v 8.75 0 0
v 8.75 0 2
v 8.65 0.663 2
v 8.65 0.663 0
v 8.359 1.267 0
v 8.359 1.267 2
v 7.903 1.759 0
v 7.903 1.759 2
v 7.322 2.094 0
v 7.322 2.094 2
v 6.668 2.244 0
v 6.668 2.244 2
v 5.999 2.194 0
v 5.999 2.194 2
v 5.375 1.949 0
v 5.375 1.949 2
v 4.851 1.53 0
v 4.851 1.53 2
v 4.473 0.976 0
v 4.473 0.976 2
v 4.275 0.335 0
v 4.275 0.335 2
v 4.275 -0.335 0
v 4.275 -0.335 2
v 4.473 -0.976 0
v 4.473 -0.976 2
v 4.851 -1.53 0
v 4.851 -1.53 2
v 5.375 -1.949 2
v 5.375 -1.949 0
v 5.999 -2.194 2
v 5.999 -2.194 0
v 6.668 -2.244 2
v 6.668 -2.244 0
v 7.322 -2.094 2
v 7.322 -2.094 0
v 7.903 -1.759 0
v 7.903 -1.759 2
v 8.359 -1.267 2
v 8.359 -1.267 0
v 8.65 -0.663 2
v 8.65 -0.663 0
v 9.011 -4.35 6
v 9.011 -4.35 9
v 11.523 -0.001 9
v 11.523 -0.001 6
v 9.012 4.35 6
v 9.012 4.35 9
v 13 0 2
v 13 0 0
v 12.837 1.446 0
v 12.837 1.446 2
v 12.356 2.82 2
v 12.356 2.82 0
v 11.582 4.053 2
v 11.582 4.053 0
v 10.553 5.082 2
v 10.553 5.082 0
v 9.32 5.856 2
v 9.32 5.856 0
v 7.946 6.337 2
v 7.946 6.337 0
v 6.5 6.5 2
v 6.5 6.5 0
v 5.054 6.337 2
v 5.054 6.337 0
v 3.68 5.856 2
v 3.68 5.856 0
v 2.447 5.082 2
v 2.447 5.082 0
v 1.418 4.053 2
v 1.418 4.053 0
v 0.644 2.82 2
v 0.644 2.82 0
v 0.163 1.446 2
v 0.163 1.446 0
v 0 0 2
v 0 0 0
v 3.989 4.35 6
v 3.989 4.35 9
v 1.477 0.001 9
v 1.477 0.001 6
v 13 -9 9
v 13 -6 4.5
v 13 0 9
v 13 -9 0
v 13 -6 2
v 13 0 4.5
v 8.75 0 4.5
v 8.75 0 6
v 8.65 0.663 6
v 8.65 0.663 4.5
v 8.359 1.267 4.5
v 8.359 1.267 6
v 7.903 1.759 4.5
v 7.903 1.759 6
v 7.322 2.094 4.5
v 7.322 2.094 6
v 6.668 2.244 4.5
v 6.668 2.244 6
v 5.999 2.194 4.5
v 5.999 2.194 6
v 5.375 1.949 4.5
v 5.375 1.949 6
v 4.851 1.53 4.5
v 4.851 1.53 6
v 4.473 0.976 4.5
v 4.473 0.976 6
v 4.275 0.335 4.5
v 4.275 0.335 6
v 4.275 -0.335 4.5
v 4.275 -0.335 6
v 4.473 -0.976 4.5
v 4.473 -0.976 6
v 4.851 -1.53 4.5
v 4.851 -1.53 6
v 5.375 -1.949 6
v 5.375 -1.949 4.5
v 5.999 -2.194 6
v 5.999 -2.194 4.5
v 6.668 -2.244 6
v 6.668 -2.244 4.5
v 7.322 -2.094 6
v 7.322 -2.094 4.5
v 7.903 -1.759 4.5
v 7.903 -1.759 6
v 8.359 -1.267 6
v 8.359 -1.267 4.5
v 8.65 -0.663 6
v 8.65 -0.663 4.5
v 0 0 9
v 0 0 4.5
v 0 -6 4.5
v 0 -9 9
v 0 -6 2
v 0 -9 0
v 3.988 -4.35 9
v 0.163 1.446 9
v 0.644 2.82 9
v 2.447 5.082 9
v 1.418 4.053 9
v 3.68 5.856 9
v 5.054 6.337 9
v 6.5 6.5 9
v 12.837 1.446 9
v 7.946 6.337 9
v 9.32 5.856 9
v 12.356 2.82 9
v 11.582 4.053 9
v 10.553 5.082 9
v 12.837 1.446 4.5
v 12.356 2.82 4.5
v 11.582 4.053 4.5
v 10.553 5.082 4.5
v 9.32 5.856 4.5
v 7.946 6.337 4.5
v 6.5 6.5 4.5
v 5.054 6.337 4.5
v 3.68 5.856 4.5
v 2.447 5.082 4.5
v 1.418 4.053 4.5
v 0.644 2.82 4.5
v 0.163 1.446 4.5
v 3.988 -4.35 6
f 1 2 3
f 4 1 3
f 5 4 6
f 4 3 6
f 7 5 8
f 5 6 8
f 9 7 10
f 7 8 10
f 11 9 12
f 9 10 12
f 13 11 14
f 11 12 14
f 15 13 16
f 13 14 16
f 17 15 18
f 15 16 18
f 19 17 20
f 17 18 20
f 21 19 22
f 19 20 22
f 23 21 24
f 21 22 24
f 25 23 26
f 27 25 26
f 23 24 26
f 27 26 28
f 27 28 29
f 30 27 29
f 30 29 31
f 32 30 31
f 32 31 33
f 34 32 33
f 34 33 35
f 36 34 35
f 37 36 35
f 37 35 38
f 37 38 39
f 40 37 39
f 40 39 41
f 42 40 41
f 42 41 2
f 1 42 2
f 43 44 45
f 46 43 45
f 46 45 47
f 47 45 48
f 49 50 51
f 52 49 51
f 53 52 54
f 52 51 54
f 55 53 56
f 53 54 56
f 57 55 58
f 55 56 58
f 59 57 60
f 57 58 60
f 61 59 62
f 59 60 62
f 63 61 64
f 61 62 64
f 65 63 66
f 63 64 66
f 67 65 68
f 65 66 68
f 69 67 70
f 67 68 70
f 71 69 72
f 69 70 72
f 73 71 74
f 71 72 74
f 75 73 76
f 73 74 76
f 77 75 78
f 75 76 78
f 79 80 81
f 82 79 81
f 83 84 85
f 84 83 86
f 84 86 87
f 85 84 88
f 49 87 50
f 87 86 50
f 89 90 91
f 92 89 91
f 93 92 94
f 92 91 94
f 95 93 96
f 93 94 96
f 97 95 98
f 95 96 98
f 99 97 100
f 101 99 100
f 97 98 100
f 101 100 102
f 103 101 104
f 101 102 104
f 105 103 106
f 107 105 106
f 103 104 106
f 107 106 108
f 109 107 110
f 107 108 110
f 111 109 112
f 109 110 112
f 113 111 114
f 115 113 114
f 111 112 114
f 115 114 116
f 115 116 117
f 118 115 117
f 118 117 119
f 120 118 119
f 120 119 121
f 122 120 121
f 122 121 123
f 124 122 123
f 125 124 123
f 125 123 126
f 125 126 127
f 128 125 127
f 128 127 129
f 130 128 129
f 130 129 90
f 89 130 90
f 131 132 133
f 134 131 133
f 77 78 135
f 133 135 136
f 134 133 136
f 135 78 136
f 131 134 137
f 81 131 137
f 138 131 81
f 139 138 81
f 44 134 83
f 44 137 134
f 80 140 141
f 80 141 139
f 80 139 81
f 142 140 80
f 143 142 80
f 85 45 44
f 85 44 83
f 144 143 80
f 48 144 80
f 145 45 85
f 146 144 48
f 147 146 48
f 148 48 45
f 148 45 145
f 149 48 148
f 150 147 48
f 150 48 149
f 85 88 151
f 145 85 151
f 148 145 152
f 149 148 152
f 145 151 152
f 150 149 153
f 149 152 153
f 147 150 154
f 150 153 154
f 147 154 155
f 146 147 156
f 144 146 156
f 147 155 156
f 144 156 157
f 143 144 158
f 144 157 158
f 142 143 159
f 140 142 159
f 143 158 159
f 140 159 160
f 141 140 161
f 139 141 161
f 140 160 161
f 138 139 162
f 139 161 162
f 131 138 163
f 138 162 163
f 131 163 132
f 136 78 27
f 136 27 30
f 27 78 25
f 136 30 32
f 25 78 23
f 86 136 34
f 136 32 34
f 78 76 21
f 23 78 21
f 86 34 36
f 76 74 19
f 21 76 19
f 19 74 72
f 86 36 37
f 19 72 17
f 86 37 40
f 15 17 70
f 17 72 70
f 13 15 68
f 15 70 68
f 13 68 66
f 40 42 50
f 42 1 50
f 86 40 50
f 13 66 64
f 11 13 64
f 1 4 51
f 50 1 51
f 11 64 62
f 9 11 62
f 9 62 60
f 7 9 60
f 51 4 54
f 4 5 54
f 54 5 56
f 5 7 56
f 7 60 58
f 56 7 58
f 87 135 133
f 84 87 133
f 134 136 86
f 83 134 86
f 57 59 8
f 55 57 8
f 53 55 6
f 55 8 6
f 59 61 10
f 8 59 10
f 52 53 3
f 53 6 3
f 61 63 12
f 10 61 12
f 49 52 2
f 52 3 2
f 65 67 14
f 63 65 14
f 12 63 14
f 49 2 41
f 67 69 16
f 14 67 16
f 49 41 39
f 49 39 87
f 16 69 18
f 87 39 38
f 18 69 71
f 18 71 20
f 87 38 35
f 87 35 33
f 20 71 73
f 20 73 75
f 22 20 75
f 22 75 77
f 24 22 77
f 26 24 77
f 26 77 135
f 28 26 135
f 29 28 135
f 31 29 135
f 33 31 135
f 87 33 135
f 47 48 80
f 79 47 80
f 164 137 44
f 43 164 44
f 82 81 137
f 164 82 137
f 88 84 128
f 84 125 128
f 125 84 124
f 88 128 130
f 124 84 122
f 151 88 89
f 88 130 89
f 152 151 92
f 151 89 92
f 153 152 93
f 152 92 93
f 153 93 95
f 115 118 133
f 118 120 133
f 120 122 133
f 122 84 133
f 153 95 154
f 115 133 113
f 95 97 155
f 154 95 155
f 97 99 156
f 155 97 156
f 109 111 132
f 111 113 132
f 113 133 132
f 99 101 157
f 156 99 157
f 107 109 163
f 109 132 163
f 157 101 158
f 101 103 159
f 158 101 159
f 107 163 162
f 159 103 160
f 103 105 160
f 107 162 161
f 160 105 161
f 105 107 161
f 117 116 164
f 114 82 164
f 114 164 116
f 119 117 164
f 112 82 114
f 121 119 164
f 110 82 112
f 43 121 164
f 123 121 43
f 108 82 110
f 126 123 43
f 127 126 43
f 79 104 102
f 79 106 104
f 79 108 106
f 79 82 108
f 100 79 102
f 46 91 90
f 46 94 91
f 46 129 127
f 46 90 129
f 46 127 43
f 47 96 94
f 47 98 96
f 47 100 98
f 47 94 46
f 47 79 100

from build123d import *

# Parameters (mm, degrees)
F1_DEPTH = 9
F3_DEPTH = 3
F4_R     = 2.25
F5_DEPTH = 25.4
F6_W     = 16.774124
F6_H     = 2.5
F6_W_2   = 6
F7_DEPTH = 25


with BuildPart() as f1:
    # F0 (on Top) → F1 (new body)
    with BuildSketch(Plane.XY):
        with BuildLine():
            ThreePointArc((13, 0), (6.5, 6.5), (0, 0))
            Line((0, 0), (0, -9))
            Line((0, -9), (13, -9))
            Line((13, -9), (13, 0))
        make_face()
    extrude(amount=F1_DEPTH)

    # F2 (on face) → F3 (cut)
    with BuildSketch(Plane.XY.offset(9)):
        Polygon((11.522947, -0.00093), (9.012279, 4.349535), (3.989331, 4.350465), (1.477053, 0.00093), (3.987721, -4.349535), (9.010669, -4.350465), align=None)
    extrude(amount=-F3_DEPTH, mode=Mode.SUBTRACT)

    # F4 (on face) → F5 (cut)
    with BuildSketch(Plane.XY.offset(9)):
        with Locations((6.5, 0)):
            Circle(F4_R)
    extrude(amount=-F5_DEPTH, mode=Mode.SUBTRACT)

    # F6 (on face) → F7 (cut)
    with BuildSketch(Plane(origin=(0, 0, 0), x_dir=(0, -1, 0), z_dir=(-1, 0, 0))):
        with Locations((-8.387062, 3.25)):
            Rectangle(F6_W, F6_H)
        with Locations((3, 3.25)):
            Rectangle(F6_W_2, F6_H)
    extrude(amount=-F7_DEPTH, mode=Mode.SUBTRACT)


solid = f1.part
